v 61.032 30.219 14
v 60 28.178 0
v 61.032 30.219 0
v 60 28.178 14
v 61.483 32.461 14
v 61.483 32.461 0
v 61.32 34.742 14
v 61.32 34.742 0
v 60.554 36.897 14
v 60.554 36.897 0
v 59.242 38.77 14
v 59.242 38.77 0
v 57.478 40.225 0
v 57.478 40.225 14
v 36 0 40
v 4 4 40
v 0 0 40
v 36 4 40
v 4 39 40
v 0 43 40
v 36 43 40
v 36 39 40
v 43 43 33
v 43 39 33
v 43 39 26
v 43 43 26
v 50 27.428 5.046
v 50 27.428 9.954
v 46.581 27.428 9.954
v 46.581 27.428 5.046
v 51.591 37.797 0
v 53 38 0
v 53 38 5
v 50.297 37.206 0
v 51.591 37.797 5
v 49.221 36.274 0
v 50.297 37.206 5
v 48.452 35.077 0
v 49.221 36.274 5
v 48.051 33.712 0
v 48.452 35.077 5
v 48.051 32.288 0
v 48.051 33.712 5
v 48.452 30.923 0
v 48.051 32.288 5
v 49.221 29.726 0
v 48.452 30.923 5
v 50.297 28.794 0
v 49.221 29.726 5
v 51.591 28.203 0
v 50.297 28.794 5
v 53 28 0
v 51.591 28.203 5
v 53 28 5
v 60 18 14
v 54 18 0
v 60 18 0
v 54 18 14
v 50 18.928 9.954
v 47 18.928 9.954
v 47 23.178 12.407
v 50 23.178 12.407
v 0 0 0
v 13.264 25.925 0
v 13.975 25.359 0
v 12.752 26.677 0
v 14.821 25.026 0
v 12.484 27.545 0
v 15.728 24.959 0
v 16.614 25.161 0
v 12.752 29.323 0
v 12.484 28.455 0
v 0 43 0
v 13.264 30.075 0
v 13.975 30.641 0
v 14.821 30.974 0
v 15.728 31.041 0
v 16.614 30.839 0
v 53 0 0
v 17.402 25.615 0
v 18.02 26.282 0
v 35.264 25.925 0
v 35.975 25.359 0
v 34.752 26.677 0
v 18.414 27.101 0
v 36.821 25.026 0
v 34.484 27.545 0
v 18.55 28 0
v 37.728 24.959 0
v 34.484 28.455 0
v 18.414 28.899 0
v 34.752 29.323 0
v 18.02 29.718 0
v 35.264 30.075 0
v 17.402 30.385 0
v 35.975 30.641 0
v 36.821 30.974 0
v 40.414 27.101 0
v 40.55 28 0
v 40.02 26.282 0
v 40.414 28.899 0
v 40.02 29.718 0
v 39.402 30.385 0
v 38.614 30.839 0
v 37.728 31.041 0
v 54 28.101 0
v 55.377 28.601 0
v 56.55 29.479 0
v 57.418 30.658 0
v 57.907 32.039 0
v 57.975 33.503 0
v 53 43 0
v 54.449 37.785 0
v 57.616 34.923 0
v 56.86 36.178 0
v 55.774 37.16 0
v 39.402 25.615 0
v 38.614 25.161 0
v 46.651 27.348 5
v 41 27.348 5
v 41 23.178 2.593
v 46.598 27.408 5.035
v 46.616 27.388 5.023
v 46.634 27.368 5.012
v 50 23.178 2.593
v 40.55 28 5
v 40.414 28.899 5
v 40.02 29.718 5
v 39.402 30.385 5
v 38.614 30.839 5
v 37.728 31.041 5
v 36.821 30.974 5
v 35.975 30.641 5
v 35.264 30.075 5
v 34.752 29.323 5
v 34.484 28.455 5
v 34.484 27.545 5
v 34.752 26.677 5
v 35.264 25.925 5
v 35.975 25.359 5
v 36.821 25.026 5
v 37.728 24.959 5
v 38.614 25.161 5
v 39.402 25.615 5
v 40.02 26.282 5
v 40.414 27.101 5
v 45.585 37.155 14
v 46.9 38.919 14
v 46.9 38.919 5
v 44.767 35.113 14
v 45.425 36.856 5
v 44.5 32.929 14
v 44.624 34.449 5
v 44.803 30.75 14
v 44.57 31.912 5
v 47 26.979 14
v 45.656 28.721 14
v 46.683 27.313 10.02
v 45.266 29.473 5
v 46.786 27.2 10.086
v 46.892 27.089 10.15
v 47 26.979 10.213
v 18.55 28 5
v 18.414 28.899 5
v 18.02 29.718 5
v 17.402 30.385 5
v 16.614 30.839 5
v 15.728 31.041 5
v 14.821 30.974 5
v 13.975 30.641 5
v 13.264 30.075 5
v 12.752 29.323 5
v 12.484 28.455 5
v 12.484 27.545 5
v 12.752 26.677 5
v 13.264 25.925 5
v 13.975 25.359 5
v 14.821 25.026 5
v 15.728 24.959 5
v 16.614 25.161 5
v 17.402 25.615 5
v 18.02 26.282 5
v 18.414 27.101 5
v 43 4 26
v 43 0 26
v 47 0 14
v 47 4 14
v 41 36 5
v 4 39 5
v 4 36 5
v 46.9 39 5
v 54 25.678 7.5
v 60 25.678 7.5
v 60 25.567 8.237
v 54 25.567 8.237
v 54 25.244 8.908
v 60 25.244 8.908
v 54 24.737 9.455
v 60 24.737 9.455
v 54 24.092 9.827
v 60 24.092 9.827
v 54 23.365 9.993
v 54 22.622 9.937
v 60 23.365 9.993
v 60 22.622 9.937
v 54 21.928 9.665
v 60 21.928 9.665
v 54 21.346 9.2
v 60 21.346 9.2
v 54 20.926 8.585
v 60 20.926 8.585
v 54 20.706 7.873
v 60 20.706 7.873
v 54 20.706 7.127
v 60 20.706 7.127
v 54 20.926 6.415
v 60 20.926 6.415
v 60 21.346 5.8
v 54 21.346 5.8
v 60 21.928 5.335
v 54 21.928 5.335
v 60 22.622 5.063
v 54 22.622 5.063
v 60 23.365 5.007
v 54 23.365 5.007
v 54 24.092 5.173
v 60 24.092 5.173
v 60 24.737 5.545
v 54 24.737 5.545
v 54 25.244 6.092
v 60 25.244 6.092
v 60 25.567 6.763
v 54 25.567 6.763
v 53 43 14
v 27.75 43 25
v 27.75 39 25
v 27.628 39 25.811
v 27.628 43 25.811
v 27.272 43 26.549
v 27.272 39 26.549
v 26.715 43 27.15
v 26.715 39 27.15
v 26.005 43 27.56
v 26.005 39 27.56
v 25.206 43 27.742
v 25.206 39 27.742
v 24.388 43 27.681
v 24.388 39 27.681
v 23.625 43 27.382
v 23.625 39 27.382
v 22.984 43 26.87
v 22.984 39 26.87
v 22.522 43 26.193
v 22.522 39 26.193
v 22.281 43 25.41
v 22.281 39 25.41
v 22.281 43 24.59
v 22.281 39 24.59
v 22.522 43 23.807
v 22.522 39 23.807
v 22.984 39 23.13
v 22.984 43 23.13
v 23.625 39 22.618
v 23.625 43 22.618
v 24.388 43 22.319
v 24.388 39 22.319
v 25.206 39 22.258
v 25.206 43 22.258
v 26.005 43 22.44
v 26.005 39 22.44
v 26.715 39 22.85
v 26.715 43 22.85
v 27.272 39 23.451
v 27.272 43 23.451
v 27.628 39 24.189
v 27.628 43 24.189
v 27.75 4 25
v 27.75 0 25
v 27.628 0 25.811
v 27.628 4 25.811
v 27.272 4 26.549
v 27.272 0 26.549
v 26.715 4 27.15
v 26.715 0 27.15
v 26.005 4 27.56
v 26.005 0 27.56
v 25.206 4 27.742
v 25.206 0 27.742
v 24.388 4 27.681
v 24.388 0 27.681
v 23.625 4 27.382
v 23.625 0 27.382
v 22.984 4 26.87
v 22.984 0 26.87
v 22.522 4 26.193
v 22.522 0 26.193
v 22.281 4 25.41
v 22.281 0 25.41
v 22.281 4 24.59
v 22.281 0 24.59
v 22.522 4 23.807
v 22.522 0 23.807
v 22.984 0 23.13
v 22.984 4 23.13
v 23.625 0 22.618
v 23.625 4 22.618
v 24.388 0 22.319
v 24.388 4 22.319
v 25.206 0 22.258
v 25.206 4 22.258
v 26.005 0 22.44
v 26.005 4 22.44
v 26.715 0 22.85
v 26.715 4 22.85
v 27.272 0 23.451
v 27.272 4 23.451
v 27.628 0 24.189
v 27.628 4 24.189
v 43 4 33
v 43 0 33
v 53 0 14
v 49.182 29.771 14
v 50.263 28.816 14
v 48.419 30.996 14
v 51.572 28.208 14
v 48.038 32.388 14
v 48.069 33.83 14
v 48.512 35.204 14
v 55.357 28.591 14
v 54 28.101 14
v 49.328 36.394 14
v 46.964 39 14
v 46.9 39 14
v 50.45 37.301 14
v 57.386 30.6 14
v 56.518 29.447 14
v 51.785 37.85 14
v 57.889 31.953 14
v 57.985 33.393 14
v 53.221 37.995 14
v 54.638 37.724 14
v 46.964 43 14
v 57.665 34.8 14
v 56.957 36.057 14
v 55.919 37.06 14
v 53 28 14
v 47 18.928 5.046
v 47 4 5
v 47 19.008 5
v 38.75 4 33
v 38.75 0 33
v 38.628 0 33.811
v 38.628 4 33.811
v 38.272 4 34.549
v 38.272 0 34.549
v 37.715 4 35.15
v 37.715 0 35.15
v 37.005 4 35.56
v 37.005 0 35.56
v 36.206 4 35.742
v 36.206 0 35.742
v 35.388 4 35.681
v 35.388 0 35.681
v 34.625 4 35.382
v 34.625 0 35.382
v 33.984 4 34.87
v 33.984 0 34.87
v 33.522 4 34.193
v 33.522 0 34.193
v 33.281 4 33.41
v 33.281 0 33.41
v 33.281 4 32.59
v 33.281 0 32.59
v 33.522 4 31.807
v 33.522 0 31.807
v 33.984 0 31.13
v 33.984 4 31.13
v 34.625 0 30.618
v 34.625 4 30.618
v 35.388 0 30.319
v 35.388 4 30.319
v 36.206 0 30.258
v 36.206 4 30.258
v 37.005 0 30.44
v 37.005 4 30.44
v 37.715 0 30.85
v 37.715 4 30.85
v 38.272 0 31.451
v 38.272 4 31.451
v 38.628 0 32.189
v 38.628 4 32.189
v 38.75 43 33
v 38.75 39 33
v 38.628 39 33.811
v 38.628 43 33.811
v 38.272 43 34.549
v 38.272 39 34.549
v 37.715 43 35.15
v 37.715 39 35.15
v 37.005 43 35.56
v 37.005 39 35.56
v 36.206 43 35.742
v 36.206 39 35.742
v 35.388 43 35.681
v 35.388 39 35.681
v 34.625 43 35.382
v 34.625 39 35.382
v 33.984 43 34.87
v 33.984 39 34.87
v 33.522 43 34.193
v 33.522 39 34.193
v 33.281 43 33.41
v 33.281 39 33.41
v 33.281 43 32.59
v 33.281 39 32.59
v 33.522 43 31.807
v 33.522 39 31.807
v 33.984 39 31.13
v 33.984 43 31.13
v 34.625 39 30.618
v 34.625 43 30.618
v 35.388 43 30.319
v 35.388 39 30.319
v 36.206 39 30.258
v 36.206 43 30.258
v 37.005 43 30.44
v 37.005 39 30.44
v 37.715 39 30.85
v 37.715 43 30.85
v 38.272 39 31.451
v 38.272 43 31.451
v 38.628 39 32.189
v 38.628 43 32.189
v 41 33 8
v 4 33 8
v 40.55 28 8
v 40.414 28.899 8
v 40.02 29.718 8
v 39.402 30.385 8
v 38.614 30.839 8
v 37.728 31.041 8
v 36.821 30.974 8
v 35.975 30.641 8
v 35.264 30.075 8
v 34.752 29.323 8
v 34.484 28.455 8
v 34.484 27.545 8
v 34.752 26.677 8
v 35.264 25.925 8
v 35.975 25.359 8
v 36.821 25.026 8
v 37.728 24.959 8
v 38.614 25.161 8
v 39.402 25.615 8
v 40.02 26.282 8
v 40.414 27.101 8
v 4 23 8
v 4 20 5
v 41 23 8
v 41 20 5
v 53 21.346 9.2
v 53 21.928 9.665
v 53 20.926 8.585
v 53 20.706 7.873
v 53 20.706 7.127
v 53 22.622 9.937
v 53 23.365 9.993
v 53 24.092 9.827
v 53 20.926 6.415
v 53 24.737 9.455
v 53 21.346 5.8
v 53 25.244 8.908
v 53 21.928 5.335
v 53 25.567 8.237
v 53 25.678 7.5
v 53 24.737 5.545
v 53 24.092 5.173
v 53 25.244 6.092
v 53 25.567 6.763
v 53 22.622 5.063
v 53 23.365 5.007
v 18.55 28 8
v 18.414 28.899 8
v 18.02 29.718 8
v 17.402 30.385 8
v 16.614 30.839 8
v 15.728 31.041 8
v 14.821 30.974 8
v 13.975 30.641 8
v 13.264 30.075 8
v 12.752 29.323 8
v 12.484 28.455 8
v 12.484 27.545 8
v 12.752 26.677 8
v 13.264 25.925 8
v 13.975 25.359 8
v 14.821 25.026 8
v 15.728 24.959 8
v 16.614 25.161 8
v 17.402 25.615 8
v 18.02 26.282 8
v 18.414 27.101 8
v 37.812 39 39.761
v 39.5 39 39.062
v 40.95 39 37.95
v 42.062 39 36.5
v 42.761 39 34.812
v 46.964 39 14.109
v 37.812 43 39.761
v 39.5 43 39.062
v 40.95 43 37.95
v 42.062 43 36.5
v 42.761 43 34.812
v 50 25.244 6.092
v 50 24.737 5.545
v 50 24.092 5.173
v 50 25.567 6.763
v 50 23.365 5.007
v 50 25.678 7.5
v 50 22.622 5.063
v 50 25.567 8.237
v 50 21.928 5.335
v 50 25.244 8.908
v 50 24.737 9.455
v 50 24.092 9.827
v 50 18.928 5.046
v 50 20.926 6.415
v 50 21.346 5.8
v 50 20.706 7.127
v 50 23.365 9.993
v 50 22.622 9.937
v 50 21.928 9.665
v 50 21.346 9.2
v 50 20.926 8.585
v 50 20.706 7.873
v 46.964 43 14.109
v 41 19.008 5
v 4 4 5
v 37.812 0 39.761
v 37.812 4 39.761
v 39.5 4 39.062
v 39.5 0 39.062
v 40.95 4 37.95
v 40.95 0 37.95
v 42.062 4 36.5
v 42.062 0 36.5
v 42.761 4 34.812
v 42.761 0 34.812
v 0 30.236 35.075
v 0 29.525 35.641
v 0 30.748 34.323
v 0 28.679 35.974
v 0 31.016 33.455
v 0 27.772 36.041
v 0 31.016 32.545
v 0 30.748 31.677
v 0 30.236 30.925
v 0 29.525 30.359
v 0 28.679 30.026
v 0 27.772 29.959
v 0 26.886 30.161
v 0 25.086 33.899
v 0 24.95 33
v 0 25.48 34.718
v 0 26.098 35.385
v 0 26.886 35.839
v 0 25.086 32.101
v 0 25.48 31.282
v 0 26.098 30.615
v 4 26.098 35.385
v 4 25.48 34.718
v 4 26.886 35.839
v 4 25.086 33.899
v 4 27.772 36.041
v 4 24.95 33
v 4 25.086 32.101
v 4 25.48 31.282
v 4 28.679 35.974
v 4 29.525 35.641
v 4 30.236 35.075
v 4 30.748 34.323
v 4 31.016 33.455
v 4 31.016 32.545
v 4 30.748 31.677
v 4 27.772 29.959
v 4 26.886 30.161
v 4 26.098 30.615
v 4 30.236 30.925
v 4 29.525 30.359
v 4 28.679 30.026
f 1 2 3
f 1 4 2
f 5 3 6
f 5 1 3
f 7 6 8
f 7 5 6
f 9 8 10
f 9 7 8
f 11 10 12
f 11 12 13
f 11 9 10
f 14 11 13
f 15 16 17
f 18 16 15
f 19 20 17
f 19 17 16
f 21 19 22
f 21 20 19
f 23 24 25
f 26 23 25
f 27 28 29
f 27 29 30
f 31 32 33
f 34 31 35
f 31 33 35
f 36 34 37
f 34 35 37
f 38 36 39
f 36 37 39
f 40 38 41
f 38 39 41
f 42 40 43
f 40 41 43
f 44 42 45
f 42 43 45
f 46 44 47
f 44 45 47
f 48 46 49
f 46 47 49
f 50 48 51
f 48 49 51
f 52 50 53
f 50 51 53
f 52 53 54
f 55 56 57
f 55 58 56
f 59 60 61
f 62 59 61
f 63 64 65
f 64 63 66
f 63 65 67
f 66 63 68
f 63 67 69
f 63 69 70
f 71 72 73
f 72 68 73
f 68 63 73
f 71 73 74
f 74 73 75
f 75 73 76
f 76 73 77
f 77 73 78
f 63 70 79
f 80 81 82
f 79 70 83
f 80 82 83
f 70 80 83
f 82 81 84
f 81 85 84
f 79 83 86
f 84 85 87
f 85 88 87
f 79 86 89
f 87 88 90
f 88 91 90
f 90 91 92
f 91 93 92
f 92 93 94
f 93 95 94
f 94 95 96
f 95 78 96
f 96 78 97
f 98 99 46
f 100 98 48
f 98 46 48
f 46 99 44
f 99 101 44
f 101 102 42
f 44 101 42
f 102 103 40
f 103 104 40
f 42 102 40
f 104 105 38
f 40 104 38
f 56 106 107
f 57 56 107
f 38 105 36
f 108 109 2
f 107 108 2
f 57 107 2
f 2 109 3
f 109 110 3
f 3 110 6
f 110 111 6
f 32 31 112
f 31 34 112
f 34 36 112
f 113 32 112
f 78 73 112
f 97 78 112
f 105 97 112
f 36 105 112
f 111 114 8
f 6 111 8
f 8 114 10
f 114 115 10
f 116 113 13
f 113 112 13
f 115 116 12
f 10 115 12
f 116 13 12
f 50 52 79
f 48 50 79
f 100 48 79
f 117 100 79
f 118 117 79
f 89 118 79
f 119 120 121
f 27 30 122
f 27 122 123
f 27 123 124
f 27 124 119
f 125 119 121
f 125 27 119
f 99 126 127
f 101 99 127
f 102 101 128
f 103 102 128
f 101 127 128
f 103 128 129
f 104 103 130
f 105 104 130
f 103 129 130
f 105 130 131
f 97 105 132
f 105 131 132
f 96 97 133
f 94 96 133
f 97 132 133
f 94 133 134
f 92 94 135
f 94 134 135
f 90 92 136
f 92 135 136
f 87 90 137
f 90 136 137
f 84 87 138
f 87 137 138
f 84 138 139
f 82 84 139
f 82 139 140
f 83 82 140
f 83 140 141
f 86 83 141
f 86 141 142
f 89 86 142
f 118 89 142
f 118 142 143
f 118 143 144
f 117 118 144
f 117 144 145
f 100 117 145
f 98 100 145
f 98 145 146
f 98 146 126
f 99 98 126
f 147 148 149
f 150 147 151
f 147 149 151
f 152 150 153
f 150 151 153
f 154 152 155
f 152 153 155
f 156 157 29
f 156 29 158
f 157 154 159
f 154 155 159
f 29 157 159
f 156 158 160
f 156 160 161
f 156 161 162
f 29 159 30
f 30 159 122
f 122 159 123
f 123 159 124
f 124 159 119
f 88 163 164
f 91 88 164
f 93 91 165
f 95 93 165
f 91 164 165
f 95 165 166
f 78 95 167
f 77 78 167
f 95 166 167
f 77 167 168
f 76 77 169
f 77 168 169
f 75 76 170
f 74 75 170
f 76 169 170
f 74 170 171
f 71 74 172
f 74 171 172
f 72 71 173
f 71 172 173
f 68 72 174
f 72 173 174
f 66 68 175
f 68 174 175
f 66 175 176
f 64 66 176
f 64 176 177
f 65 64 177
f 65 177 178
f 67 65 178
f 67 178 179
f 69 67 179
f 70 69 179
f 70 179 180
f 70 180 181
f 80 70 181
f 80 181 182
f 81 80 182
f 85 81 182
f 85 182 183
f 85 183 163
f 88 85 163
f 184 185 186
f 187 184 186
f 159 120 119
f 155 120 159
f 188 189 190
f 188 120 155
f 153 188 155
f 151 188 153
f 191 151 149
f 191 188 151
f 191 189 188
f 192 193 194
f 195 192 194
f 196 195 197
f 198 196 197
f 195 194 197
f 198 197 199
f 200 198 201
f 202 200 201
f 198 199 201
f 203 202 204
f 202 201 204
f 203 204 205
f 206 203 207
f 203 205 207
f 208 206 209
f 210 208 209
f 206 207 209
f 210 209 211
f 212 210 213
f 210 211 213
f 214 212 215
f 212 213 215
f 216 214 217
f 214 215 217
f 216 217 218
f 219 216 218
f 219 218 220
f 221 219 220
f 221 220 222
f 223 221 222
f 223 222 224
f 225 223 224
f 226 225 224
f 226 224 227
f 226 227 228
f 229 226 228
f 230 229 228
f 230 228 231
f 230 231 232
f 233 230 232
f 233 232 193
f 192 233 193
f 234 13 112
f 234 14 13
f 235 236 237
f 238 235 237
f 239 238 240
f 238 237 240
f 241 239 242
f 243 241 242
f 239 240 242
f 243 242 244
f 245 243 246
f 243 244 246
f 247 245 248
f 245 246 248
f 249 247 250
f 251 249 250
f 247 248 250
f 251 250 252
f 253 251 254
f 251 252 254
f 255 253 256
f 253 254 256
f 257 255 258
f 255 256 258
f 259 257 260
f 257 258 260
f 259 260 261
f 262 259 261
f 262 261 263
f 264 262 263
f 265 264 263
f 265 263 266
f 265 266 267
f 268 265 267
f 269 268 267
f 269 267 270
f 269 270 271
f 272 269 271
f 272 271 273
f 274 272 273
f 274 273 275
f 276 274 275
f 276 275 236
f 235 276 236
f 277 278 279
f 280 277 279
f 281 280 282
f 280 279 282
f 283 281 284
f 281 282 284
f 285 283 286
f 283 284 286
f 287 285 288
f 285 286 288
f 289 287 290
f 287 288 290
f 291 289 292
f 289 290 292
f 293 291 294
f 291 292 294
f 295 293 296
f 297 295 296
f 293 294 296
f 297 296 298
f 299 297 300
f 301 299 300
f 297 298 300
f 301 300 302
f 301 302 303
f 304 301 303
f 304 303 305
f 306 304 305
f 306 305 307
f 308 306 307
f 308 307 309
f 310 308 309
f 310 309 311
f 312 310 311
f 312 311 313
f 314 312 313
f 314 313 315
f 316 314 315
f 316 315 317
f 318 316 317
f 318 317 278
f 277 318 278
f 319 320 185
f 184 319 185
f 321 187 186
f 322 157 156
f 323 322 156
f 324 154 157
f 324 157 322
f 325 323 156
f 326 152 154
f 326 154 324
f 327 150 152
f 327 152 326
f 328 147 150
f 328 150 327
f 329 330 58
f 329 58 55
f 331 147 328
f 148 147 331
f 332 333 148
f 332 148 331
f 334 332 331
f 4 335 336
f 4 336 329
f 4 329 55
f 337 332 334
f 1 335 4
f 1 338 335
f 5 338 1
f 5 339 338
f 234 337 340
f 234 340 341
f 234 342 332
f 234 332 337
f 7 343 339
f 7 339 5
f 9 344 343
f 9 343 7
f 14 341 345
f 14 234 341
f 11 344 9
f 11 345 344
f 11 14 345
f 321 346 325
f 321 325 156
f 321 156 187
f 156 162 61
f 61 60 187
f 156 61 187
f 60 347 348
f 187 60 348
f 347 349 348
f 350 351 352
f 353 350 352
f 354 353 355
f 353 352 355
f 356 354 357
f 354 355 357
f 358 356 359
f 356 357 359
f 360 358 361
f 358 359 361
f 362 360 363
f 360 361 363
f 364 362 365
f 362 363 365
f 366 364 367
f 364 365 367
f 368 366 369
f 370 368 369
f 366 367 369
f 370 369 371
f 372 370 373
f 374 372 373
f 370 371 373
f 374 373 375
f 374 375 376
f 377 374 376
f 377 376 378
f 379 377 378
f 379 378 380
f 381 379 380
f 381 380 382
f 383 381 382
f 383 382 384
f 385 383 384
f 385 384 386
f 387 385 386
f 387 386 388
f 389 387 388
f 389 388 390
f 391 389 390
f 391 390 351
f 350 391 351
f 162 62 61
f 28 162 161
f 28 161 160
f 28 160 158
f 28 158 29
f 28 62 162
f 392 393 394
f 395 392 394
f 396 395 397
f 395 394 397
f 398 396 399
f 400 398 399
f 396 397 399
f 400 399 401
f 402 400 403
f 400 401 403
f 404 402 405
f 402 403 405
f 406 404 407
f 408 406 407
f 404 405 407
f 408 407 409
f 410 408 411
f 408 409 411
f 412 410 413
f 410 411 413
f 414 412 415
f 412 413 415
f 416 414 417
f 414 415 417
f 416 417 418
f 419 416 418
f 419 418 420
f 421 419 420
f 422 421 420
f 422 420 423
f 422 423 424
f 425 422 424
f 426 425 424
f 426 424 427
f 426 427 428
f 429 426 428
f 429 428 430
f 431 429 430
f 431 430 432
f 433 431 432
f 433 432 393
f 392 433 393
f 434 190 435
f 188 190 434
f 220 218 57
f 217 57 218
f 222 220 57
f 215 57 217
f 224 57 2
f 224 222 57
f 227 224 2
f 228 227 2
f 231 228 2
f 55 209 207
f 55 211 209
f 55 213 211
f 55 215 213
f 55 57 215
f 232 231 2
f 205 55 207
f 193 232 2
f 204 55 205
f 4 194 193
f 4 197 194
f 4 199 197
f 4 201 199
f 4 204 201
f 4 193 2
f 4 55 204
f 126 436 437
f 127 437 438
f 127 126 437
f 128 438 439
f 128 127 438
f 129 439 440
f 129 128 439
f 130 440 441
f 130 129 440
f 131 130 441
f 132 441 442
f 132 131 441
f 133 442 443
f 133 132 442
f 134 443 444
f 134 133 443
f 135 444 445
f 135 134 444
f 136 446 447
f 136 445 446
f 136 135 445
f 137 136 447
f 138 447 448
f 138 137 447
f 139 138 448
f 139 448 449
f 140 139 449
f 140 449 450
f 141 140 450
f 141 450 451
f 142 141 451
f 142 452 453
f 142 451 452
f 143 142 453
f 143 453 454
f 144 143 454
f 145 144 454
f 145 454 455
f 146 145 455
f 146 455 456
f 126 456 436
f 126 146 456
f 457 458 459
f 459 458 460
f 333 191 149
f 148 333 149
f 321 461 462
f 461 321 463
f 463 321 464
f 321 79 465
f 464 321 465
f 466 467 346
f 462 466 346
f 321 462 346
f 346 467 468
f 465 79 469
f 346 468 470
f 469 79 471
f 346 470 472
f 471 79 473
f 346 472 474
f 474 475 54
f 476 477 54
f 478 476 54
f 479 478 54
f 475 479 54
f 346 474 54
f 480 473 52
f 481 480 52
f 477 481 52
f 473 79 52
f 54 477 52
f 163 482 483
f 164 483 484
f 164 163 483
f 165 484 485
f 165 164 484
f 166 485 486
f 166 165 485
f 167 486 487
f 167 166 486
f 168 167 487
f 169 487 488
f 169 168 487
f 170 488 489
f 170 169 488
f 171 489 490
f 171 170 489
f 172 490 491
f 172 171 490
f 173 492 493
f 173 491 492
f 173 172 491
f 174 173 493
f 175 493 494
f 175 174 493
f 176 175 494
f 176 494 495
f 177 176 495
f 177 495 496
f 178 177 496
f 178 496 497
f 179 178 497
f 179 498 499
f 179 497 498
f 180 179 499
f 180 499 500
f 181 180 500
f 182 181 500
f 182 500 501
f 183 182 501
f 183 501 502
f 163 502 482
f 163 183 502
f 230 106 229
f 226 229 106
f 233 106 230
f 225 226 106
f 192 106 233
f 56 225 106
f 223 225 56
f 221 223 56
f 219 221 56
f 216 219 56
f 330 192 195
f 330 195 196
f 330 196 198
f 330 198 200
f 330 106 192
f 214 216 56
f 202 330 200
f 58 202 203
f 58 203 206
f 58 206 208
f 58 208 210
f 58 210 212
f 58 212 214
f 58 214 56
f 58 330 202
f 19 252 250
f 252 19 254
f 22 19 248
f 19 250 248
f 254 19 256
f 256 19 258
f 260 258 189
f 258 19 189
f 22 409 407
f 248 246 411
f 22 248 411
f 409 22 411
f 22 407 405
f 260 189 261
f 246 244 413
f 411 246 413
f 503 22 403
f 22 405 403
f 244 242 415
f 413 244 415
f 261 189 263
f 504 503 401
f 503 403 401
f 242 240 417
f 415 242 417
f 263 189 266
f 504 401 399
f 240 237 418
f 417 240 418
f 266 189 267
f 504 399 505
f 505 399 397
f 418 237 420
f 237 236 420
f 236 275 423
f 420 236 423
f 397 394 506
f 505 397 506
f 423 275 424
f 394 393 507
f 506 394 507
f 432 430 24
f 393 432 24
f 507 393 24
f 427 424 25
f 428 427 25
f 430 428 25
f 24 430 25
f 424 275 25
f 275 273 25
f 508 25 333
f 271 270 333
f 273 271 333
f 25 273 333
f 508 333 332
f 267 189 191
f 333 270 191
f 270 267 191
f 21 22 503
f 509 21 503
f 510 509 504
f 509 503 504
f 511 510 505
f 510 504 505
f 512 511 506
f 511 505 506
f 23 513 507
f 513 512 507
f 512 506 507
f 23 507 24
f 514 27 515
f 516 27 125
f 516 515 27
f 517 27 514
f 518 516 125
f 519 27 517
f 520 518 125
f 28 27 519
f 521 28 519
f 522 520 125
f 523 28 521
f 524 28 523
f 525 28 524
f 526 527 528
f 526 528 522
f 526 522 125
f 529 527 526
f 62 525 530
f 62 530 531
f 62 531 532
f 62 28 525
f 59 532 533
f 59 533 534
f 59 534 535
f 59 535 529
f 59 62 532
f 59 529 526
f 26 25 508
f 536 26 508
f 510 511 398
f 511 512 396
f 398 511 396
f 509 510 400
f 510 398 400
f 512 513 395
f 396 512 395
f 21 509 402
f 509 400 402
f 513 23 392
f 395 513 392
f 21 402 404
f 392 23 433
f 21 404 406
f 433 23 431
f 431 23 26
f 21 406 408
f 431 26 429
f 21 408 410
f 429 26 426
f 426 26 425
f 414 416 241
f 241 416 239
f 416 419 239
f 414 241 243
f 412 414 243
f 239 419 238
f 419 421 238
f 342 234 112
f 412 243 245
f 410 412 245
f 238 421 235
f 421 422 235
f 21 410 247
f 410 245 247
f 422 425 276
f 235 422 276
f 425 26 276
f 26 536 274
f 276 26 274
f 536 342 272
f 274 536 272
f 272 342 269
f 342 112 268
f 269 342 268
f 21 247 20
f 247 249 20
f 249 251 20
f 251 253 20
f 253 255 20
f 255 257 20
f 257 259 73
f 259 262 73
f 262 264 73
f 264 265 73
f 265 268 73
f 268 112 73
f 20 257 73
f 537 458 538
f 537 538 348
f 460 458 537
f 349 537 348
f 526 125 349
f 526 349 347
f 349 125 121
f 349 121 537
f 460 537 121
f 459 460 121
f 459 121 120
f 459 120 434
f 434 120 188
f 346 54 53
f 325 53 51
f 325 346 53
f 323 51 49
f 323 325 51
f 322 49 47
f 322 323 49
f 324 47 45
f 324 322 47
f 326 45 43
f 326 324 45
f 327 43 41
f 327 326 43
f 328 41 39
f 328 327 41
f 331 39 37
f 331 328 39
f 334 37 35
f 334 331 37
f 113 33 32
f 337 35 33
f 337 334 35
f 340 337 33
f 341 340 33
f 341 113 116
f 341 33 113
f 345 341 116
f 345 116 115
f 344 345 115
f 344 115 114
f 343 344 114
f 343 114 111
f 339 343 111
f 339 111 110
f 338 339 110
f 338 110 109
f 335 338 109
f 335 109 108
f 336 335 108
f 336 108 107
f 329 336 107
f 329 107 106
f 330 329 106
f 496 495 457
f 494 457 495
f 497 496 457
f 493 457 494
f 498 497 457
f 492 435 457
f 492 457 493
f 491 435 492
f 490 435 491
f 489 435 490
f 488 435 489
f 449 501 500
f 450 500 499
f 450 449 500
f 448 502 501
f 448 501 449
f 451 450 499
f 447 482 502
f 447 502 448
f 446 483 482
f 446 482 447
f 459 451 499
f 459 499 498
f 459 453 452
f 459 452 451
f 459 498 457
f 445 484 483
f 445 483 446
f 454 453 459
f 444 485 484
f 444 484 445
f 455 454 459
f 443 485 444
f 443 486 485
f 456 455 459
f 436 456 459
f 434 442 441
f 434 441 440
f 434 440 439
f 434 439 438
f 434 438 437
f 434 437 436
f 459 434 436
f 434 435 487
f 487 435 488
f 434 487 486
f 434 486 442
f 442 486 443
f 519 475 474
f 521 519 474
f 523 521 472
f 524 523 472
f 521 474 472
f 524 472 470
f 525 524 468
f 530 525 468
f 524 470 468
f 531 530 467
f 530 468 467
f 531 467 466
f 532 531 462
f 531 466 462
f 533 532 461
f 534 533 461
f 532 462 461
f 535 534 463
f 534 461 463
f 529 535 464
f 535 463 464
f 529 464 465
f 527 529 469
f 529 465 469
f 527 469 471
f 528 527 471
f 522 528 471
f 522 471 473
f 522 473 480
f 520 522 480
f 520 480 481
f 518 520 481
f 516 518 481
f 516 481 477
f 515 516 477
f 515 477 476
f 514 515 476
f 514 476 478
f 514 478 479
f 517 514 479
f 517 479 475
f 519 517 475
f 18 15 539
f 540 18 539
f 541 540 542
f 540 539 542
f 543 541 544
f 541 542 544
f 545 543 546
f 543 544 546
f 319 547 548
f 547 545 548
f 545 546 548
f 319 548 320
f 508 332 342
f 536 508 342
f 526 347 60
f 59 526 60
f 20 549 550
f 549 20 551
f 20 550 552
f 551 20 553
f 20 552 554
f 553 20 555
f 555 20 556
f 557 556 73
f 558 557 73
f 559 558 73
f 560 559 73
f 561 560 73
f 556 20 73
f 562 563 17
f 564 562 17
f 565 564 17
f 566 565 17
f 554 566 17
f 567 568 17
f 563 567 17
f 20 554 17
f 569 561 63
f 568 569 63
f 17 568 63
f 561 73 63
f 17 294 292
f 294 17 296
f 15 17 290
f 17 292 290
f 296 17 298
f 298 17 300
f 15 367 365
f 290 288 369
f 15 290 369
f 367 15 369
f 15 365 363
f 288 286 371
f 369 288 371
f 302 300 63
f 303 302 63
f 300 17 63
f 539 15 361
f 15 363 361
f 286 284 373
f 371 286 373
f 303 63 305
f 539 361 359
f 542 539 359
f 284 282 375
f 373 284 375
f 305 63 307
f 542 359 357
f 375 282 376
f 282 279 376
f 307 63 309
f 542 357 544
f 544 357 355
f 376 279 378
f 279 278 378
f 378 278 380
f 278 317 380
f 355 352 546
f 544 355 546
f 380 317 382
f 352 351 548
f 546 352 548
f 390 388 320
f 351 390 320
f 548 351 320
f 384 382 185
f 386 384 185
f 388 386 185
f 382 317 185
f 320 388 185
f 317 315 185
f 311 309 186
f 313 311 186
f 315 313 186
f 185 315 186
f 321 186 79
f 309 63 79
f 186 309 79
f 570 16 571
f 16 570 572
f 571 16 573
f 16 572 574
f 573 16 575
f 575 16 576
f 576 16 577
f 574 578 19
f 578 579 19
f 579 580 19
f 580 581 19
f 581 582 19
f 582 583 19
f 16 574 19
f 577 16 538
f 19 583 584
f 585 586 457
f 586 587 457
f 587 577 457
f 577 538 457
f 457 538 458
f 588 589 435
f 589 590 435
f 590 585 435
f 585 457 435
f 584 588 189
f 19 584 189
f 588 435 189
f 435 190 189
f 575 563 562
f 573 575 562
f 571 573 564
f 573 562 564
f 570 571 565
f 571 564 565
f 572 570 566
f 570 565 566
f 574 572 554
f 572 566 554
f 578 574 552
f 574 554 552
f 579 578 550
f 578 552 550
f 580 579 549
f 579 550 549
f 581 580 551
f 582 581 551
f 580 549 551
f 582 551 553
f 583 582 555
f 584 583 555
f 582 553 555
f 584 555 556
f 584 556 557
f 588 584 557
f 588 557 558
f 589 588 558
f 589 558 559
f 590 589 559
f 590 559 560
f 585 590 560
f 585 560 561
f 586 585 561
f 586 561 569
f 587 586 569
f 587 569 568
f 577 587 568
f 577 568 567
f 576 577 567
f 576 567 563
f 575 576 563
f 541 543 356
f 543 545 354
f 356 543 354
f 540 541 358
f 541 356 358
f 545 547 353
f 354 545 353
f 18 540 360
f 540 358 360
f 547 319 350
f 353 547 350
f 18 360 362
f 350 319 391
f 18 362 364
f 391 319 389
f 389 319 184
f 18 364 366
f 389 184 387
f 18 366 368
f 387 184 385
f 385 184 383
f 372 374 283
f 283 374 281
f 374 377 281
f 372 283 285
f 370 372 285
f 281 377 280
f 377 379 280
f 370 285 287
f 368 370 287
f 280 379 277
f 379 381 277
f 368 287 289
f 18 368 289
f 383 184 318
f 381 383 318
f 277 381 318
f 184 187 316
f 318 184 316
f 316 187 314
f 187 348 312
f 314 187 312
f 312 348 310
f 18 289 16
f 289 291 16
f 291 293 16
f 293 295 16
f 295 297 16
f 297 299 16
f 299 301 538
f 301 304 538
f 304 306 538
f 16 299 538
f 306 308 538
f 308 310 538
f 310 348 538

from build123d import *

# Parameters (mm, degrees)
F0_W           = 53
F0_H           = 43
F1_DEPTH       = 5
F3_DEPTH       = 9
F3_DEPTH_BACK  = 5
F4_DEPTH       = 25
F6_DEPTH       = 35
F7_R           = 2.75
F8_DEPTH       = 43.001
F10_DEPTH      = 3
F10_DEPTH_BACK = 6
F11_R          = 2.5
F12_DEPTH      = 25
F13_W          = 37.7532099868
F13_H          = 10
F14_DEPTH      = 3
F15_R          = 3.05
F16_DEPTH      = 25
F16_DEPTH_BACK = 25
F17_SIZE       = 2.99999
F18_R          = 3.05
F19_DEPTH      = 25


# Not quite as in the source:
# - a fillet or chamfer is up to 0.001 mm smaller than in the source, because OpenCascade refuses the exact size


with BuildPart() as f1:
    # F0 (on Top) → F1 (new body)
    with BuildSketch(Plane.XY):
        with Locations((26.5, 21.5)):
            Rectangle(F0_W, F0_H)
    extrude(amount=F1_DEPTH)

    # F2 (on face) → F3 (join, two sides)
    with BuildSketch(Plane.XY.offset(5)) as f3_sk:
        with BuildLine():
            Line((47, 0), (53, 0))
            Line((53, 0), (53, 24.5))
            Line((53, 24.5), (53, 28))
            ThreePointArc((53, 28), (52.49745519, 37.974680765), (54, 28.1010205144))
            Line((54, 28.1010205144), (54, 24.5590284919))
            Line((54, 24.5590284919), (54, 18))
            Line((54, 18), (60, 18))
            Line((60, 18), (60, 25.8046761155))
            Line((60, 25.8046761155), (60, 28.1781746195))
            ThreePointArc((60, 28.1781746195), (61.3195930877, 34.7419445616), (57.477652845, 40.225))
            Line((57.477652845, 40.225), (53, 43))
            Line((53, 43), (47, 43))
            Line((47, 43), (46.9, 43))
            Line((46.9, 43), (46.9, 38.9194594348))
            ThreePointArc((46.9, 38.9194594348), (44.5002980841, 32.9288147474), (47, 26.9792027106))
            Line((47, 26.9792027106), (47, 0))
        make_face()
    extrude(amount=F3_DEPTH)
    extrude(f3_sk.sketch, amount=-F3_DEPTH_BACK)

    # F2 (on face) → F4 (cut)
    with BuildSketch(Plane.XY.offset(5)):
        with BuildLine():
            ThreePointArc((53, 38), (48, 33), (53, 28))
            Line((53, 28), (53, 28.1010205144))
            Line((53, 28.1010205144), (53, 38))
        make_face()
    extrude(amount=-F4_DEPTH, mode=Mode.SUBTRACT)

    # F5 (on face) → F6 (join)
    with BuildSketch(Plane.XY.offset(5)):
        Polygon((0, 43), (0, 0), (47, 0), (47, 4.00000019), (4.00000019, 4.00000019), (4.00000019, 38.99999981), (46.9636693597, 38.99999981), (46.9636693597, 43), align=None)
    extrude(amount=F6_DEPTH)

    # F7 (on face) → F8 (cut, through all)
    with BuildSketch(Plane.XZ):
        with Locations((36, 33)):
            Circle(F7_R)
        with Locations((25, 25)):
            Circle(F7_R)
        with BuildLine():
            ThreePointArc((36, 40), (40.9497474683, 37.9497474683), (43, 33))
            Line((43, 33), (43, 26))
            Line((43, 26), (47, 14))
            Line((47, 14), (47, 40))
            Line((47, 40), (36, 40))
        make_face()
    extrude(amount=-F8_DEPTH, mode=Mode.SUBTRACT)

    # F9 (on face) → F10 (cut, two sides)
    with BuildSketch(Plane(origin=(47, 0, 0), x_dir=(0, -1, 0), z_dir=(-1, 0, 0))) as f10_sk:
        Polygon((-18.9281746195, 5.0462613559), (-18.9281746195, 9.9537386441), (-23.1781746195, 12.4074772881), (-27.4281746195, 9.9537386441), (-27.4281746195, 5.0462613559), (-23.1781746195, 2.5925227119), align=None)
    extrude(amount=-F10_DEPTH, mode=Mode.SUBTRACT)
    extrude(f10_sk.sketch, amount=F10_DEPTH_BACK, mode=Mode.SUBTRACT)

    # F11 (on face) → F12 (cut)
    with BuildSketch(Plane.YZ.offset(60)):
        with Locations((23.1781746195, 7.5)):
            Circle(F11_R)
    extrude(amount=-F12_DEPTH, mode=Mode.SUBTRACT)

    # F13 (on face) → F14 (join)
    with BuildSketch(Plane.XY.offset(5)):
        with Locations((22.1233950066, 28)):
            Rectangle(F13_W, F13_H)
    extrude(amount=F14_DEPTH)

    # F15 (on face) → F16 (cut, two sides)
    with BuildSketch(Plane.XY.offset(5)) as f16_sk:
        with Locations((15.5, 28)):
            Circle(F15_R)
        with Locations((37.5, 28)):
            Circle(F15_R)
    extrude(amount=-F16_DEPTH, mode=Mode.SUBTRACT)
    extrude(f16_sk.sketch, amount=F16_DEPTH_BACK, mode=Mode.SUBTRACT)

    # F17 (size 3 in the source; OpenCascade refuses exactly that, so slightly less here)
    f17_edges = [f1.edges().sort_by_distance(p)[0] for p in [
        (22.5, 23, 5),
        (22.5, 33, 5),
    ]]
    chamfer(f17_edges, length=F17_SIZE)

    # F18 (on face) → F19 (cut)
    with BuildSketch(Plane(origin=(0, 0, 0), x_dir=(0, -1, 0), z_dir=(-1, 0, 0))):
        with Locations((-28, 33)):
            Circle(F18_R)
    extrude(amount=-F19_DEPTH, mode=Mode.SUBTRACT)


solid = f1.part
